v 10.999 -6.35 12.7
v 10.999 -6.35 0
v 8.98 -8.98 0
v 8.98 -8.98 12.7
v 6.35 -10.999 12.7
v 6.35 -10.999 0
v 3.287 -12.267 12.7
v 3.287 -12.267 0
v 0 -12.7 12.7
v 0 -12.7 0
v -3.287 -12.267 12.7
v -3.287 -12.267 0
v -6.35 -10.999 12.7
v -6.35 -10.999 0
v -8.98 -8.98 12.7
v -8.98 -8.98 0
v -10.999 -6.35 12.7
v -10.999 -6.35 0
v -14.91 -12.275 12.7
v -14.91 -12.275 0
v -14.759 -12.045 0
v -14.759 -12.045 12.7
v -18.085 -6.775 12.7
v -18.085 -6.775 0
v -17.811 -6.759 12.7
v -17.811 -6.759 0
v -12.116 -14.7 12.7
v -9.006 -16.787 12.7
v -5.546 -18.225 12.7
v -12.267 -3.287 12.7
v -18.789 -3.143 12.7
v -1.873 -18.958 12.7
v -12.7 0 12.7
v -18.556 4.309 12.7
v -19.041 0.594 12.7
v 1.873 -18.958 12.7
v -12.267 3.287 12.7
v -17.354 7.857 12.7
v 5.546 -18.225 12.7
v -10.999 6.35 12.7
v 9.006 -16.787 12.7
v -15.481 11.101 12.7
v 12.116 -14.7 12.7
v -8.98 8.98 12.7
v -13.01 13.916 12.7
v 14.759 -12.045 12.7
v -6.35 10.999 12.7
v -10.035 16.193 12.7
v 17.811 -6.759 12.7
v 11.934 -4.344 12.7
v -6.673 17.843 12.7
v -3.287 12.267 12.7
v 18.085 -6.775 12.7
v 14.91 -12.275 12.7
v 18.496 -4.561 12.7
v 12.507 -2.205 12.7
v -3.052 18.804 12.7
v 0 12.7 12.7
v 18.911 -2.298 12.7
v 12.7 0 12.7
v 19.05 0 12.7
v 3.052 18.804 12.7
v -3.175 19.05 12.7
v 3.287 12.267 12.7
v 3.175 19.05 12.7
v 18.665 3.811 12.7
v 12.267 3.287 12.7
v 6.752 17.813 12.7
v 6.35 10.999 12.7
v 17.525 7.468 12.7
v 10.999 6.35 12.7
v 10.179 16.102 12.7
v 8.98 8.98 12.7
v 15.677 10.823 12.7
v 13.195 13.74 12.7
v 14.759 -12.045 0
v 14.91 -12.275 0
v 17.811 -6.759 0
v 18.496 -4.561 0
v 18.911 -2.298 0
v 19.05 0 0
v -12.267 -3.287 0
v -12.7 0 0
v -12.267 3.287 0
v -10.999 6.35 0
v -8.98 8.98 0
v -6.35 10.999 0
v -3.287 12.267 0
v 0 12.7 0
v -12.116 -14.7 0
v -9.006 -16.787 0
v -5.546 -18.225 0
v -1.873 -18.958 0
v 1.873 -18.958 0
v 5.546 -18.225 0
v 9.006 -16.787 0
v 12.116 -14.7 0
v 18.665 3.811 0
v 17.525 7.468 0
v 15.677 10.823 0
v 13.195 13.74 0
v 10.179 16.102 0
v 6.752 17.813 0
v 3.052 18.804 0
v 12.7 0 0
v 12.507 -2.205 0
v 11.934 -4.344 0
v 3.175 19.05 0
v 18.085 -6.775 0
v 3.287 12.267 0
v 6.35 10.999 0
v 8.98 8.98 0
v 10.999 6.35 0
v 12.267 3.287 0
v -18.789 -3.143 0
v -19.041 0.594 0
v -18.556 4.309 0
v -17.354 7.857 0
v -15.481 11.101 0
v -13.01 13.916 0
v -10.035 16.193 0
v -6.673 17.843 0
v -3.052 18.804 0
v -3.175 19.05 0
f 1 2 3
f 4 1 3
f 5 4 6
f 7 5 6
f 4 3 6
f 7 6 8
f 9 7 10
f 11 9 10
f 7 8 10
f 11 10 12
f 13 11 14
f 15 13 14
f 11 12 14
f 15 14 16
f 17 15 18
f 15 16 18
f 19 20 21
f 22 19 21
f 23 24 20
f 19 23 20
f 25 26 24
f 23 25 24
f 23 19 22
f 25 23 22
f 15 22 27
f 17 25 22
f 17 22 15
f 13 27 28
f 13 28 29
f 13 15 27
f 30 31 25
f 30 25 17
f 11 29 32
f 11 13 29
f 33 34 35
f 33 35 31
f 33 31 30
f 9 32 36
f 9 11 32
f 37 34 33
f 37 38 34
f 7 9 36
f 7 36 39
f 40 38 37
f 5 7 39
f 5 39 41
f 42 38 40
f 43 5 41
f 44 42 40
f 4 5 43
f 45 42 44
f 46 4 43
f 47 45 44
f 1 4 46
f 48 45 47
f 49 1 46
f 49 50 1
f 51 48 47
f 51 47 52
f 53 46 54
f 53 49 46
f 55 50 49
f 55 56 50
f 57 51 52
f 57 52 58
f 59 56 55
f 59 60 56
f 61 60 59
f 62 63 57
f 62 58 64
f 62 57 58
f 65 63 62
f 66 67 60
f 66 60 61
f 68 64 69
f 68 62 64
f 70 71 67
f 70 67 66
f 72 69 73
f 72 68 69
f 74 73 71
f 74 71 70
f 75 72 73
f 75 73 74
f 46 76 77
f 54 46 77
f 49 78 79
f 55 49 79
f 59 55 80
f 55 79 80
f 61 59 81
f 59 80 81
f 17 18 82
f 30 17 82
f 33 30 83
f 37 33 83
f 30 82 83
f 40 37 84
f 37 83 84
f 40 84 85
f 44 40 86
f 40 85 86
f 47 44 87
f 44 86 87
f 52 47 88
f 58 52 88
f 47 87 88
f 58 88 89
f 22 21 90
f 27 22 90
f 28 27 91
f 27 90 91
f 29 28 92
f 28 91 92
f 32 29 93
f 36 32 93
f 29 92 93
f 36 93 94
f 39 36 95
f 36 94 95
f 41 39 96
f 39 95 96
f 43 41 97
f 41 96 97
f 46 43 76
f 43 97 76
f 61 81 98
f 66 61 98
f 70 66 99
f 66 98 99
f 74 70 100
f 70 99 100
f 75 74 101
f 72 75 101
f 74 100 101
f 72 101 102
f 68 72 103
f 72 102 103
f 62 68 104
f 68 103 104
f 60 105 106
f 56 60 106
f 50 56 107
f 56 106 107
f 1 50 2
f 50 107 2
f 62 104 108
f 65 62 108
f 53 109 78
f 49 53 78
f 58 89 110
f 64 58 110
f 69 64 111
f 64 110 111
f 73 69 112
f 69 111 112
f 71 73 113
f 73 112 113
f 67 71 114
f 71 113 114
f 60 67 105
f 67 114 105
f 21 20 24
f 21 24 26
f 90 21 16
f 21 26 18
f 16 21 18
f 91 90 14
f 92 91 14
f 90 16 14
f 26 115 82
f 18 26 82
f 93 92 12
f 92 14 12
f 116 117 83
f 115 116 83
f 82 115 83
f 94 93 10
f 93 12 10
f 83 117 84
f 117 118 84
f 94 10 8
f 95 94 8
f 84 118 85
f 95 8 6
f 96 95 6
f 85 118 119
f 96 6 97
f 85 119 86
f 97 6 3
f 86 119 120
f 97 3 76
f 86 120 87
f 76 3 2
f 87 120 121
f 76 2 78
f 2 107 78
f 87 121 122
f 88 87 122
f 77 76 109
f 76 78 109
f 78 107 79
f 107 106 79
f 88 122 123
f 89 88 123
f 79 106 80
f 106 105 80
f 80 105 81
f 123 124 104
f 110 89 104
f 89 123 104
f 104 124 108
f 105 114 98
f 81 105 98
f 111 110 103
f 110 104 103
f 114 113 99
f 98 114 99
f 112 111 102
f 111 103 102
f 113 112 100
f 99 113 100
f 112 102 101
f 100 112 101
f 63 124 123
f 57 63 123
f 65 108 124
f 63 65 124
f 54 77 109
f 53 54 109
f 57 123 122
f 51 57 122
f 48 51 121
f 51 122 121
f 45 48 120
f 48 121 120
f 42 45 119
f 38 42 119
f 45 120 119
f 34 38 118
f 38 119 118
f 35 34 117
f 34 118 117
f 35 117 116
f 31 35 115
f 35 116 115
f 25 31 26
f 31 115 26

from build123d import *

# Parameters (mm, degrees)
F1_DEPTH = 12.7


with BuildPart() as f1:
    # F0 (on Top) → F1 (new body)
    with BuildSketch(Plane.XY):
        with BuildLine():
            ThreePointArc((0, 12.7), (8.9802561211, 8.9802561211), (12.7, 0))
            ThreePointArc((12.7, 0), (12.2672579939, -3.2870018728), (10.9985226281, -6.35))
            Line((10.9985226281, -6.35), (17.8106697795, -6.7588861512))
            ThreePointArc((17.8106697795, -6.7588861512), (18.7376060277, -3.4357852596), (19.05, 0))
            ThreePointArc((19.05, 0), (14.5093501963, 12.3442803306), (3.0519677815, 18.8039355631))
            Line((3.0519677815, 18.8039355631), (0, 12.7))
        make_face()
        with BuildLine():
            Line((-3.0519677815, 18.8039355631), (0, 12.7))
            Line((0, 12.7), (0, 19.05))
            ThreePointArc((0, 19.05), (-1.5309355838, 18.9883842451), (-3.0519677815, 18.8039355631))
        make_face()
        with BuildLine():
            ThreePointArc((-10.9985226281, -6.35), (-10.9985226281, 6.35), (0, 12.7))
            Line((0, 12.7), (-3.0519677815, 18.8039355631))
            ThreePointArc((-3.0519677815, 18.8039355631), (-16.4977839421, 9.525), (-17.8106697795, -6.7588861512))
            Line((-17.8106697795, -6.7588861512), (-10.9985226281, -6.35))
        make_face()
        with BuildLine():
            Line((0, 19.05), (0, 12.7))
            Line((0, 12.7), (3.0519677815, 18.8039355631))
            ThreePointArc((3.0519677815, 18.8039355631), (1.5309355838, 18.9883842451), (0, 19.05))
        make_face()
        with BuildLine():
            Line((14.758701998, -12.0450494119), (10.9985226281, -6.35))
            ThreePointArc((10.9985226281, -6.35), (0, -12.7), (-10.9985226281, -6.35))
            Line((-10.9985226281, -6.35), (-14.758701998, -12.0450494119))
            ThreePointArc((-14.758701998, -12.0450494119), (0, -19.05), (14.758701998, -12.0450494119))
        make_face()
        with BuildLine():
            Line((17.8106697795, -6.7588861512), (10.9985226281, -6.35))
            Line((10.9985226281, -6.35), (16.4977839421, -9.525))
            ThreePointArc((16.4977839421, -9.525), (17.2098909249, -8.1683630154), (17.8106697795, -6.7588861512))
        make_face()
        with BuildLine():
            Line((16.4977839421, -9.525), (10.9985226281, -6.35))
            Line((10.9985226281, -6.35), (14.758701998, -12.0450494119))
            ThreePointArc((14.758701998, -12.0450494119), (15.6789553412, -10.8200212296), (16.4977839421, -9.525))
        make_face()
        with BuildLine():
            Line((-14.758701998, -12.0450494119), (-10.9985226281, -6.35))
            Line((-10.9985226281, -6.35), (-16.4977839421, -9.525))
            ThreePointArc((-16.4977839421, -9.525), (-15.6789553412, -10.8200212296), (-14.758701998, -12.0450494119))
        make_face()
        with BuildLine():
            Line((-16.4977839421, -9.525), (-10.9985226281, -6.35))
            Line((-10.9985226281, -6.35), (-17.8106697795, -6.7588861512))
            ThreePointArc((-17.8106697795, -6.7588861512), (-17.2098909249, -8.1683630154), (-16.4977839421, -9.525))
        make_face()
        with BuildLine():
            Line((3.175, 19.05), (0, 19.05))
            ThreePointArc((0, 19.05), (1.5309355838, 18.9883842451), (3.0519677815, 18.8039355631))
            Line((3.0519677815, 18.8039355631), (3.175, 19.05))
        make_face()
        with BuildLine():
            ThreePointArc((-3.0519677815, 18.8039355631), (-1.5309355838, 18.9883842451), (0, 19.05))
            Line((0, 19.05), (-3.175, 19.05))
            Line((-3.175, 19.05), (-3.0519677815, 18.8039355631))
        make_face()
        with BuildLine():
            Line((14.9102839421, -12.274630657), (16.4977839421, -9.525))
            ThreePointArc((16.4977839421, -9.525), (15.6789553412, -10.8200212296), (14.758701998, -12.0450494119))
            Line((14.758701998, -12.0450494119), (14.9102839421, -12.274630657))
        make_face()
        with BuildLine():
            ThreePointArc((17.8106697795, -6.7588861512), (17.2098909249, -8.1683630154), (16.4977839421, -9.525))
            Line((16.4977839421, -9.525), (18.0852839421, -6.775369343))
            Line((18.0852839421, -6.775369343), (17.8106697795, -6.7588861512))
        make_face()
        with BuildLine():
            Line((-18.0852839421, -6.775369343), (-16.4977839421, -9.525))
            ThreePointArc((-16.4977839421, -9.525), (-17.2098909249, -8.1683630154), (-17.8106697795, -6.7588861512))
            Line((-17.8106697795, -6.7588861512), (-18.0852839421, -6.775369343))
        make_face()
        with BuildLine():
            ThreePointArc((-14.758701998, -12.0450494119), (-15.6789553412, -10.8200212296), (-16.4977839421, -9.525))
            Line((-16.4977839421, -9.525), (-14.9102839421, -12.274630657))
            Line((-14.9102839421, -12.274630657), (-14.758701998, -12.0450494119))
        make_face()
    extrude(amount=F1_DEPTH)


solid = f1.part
